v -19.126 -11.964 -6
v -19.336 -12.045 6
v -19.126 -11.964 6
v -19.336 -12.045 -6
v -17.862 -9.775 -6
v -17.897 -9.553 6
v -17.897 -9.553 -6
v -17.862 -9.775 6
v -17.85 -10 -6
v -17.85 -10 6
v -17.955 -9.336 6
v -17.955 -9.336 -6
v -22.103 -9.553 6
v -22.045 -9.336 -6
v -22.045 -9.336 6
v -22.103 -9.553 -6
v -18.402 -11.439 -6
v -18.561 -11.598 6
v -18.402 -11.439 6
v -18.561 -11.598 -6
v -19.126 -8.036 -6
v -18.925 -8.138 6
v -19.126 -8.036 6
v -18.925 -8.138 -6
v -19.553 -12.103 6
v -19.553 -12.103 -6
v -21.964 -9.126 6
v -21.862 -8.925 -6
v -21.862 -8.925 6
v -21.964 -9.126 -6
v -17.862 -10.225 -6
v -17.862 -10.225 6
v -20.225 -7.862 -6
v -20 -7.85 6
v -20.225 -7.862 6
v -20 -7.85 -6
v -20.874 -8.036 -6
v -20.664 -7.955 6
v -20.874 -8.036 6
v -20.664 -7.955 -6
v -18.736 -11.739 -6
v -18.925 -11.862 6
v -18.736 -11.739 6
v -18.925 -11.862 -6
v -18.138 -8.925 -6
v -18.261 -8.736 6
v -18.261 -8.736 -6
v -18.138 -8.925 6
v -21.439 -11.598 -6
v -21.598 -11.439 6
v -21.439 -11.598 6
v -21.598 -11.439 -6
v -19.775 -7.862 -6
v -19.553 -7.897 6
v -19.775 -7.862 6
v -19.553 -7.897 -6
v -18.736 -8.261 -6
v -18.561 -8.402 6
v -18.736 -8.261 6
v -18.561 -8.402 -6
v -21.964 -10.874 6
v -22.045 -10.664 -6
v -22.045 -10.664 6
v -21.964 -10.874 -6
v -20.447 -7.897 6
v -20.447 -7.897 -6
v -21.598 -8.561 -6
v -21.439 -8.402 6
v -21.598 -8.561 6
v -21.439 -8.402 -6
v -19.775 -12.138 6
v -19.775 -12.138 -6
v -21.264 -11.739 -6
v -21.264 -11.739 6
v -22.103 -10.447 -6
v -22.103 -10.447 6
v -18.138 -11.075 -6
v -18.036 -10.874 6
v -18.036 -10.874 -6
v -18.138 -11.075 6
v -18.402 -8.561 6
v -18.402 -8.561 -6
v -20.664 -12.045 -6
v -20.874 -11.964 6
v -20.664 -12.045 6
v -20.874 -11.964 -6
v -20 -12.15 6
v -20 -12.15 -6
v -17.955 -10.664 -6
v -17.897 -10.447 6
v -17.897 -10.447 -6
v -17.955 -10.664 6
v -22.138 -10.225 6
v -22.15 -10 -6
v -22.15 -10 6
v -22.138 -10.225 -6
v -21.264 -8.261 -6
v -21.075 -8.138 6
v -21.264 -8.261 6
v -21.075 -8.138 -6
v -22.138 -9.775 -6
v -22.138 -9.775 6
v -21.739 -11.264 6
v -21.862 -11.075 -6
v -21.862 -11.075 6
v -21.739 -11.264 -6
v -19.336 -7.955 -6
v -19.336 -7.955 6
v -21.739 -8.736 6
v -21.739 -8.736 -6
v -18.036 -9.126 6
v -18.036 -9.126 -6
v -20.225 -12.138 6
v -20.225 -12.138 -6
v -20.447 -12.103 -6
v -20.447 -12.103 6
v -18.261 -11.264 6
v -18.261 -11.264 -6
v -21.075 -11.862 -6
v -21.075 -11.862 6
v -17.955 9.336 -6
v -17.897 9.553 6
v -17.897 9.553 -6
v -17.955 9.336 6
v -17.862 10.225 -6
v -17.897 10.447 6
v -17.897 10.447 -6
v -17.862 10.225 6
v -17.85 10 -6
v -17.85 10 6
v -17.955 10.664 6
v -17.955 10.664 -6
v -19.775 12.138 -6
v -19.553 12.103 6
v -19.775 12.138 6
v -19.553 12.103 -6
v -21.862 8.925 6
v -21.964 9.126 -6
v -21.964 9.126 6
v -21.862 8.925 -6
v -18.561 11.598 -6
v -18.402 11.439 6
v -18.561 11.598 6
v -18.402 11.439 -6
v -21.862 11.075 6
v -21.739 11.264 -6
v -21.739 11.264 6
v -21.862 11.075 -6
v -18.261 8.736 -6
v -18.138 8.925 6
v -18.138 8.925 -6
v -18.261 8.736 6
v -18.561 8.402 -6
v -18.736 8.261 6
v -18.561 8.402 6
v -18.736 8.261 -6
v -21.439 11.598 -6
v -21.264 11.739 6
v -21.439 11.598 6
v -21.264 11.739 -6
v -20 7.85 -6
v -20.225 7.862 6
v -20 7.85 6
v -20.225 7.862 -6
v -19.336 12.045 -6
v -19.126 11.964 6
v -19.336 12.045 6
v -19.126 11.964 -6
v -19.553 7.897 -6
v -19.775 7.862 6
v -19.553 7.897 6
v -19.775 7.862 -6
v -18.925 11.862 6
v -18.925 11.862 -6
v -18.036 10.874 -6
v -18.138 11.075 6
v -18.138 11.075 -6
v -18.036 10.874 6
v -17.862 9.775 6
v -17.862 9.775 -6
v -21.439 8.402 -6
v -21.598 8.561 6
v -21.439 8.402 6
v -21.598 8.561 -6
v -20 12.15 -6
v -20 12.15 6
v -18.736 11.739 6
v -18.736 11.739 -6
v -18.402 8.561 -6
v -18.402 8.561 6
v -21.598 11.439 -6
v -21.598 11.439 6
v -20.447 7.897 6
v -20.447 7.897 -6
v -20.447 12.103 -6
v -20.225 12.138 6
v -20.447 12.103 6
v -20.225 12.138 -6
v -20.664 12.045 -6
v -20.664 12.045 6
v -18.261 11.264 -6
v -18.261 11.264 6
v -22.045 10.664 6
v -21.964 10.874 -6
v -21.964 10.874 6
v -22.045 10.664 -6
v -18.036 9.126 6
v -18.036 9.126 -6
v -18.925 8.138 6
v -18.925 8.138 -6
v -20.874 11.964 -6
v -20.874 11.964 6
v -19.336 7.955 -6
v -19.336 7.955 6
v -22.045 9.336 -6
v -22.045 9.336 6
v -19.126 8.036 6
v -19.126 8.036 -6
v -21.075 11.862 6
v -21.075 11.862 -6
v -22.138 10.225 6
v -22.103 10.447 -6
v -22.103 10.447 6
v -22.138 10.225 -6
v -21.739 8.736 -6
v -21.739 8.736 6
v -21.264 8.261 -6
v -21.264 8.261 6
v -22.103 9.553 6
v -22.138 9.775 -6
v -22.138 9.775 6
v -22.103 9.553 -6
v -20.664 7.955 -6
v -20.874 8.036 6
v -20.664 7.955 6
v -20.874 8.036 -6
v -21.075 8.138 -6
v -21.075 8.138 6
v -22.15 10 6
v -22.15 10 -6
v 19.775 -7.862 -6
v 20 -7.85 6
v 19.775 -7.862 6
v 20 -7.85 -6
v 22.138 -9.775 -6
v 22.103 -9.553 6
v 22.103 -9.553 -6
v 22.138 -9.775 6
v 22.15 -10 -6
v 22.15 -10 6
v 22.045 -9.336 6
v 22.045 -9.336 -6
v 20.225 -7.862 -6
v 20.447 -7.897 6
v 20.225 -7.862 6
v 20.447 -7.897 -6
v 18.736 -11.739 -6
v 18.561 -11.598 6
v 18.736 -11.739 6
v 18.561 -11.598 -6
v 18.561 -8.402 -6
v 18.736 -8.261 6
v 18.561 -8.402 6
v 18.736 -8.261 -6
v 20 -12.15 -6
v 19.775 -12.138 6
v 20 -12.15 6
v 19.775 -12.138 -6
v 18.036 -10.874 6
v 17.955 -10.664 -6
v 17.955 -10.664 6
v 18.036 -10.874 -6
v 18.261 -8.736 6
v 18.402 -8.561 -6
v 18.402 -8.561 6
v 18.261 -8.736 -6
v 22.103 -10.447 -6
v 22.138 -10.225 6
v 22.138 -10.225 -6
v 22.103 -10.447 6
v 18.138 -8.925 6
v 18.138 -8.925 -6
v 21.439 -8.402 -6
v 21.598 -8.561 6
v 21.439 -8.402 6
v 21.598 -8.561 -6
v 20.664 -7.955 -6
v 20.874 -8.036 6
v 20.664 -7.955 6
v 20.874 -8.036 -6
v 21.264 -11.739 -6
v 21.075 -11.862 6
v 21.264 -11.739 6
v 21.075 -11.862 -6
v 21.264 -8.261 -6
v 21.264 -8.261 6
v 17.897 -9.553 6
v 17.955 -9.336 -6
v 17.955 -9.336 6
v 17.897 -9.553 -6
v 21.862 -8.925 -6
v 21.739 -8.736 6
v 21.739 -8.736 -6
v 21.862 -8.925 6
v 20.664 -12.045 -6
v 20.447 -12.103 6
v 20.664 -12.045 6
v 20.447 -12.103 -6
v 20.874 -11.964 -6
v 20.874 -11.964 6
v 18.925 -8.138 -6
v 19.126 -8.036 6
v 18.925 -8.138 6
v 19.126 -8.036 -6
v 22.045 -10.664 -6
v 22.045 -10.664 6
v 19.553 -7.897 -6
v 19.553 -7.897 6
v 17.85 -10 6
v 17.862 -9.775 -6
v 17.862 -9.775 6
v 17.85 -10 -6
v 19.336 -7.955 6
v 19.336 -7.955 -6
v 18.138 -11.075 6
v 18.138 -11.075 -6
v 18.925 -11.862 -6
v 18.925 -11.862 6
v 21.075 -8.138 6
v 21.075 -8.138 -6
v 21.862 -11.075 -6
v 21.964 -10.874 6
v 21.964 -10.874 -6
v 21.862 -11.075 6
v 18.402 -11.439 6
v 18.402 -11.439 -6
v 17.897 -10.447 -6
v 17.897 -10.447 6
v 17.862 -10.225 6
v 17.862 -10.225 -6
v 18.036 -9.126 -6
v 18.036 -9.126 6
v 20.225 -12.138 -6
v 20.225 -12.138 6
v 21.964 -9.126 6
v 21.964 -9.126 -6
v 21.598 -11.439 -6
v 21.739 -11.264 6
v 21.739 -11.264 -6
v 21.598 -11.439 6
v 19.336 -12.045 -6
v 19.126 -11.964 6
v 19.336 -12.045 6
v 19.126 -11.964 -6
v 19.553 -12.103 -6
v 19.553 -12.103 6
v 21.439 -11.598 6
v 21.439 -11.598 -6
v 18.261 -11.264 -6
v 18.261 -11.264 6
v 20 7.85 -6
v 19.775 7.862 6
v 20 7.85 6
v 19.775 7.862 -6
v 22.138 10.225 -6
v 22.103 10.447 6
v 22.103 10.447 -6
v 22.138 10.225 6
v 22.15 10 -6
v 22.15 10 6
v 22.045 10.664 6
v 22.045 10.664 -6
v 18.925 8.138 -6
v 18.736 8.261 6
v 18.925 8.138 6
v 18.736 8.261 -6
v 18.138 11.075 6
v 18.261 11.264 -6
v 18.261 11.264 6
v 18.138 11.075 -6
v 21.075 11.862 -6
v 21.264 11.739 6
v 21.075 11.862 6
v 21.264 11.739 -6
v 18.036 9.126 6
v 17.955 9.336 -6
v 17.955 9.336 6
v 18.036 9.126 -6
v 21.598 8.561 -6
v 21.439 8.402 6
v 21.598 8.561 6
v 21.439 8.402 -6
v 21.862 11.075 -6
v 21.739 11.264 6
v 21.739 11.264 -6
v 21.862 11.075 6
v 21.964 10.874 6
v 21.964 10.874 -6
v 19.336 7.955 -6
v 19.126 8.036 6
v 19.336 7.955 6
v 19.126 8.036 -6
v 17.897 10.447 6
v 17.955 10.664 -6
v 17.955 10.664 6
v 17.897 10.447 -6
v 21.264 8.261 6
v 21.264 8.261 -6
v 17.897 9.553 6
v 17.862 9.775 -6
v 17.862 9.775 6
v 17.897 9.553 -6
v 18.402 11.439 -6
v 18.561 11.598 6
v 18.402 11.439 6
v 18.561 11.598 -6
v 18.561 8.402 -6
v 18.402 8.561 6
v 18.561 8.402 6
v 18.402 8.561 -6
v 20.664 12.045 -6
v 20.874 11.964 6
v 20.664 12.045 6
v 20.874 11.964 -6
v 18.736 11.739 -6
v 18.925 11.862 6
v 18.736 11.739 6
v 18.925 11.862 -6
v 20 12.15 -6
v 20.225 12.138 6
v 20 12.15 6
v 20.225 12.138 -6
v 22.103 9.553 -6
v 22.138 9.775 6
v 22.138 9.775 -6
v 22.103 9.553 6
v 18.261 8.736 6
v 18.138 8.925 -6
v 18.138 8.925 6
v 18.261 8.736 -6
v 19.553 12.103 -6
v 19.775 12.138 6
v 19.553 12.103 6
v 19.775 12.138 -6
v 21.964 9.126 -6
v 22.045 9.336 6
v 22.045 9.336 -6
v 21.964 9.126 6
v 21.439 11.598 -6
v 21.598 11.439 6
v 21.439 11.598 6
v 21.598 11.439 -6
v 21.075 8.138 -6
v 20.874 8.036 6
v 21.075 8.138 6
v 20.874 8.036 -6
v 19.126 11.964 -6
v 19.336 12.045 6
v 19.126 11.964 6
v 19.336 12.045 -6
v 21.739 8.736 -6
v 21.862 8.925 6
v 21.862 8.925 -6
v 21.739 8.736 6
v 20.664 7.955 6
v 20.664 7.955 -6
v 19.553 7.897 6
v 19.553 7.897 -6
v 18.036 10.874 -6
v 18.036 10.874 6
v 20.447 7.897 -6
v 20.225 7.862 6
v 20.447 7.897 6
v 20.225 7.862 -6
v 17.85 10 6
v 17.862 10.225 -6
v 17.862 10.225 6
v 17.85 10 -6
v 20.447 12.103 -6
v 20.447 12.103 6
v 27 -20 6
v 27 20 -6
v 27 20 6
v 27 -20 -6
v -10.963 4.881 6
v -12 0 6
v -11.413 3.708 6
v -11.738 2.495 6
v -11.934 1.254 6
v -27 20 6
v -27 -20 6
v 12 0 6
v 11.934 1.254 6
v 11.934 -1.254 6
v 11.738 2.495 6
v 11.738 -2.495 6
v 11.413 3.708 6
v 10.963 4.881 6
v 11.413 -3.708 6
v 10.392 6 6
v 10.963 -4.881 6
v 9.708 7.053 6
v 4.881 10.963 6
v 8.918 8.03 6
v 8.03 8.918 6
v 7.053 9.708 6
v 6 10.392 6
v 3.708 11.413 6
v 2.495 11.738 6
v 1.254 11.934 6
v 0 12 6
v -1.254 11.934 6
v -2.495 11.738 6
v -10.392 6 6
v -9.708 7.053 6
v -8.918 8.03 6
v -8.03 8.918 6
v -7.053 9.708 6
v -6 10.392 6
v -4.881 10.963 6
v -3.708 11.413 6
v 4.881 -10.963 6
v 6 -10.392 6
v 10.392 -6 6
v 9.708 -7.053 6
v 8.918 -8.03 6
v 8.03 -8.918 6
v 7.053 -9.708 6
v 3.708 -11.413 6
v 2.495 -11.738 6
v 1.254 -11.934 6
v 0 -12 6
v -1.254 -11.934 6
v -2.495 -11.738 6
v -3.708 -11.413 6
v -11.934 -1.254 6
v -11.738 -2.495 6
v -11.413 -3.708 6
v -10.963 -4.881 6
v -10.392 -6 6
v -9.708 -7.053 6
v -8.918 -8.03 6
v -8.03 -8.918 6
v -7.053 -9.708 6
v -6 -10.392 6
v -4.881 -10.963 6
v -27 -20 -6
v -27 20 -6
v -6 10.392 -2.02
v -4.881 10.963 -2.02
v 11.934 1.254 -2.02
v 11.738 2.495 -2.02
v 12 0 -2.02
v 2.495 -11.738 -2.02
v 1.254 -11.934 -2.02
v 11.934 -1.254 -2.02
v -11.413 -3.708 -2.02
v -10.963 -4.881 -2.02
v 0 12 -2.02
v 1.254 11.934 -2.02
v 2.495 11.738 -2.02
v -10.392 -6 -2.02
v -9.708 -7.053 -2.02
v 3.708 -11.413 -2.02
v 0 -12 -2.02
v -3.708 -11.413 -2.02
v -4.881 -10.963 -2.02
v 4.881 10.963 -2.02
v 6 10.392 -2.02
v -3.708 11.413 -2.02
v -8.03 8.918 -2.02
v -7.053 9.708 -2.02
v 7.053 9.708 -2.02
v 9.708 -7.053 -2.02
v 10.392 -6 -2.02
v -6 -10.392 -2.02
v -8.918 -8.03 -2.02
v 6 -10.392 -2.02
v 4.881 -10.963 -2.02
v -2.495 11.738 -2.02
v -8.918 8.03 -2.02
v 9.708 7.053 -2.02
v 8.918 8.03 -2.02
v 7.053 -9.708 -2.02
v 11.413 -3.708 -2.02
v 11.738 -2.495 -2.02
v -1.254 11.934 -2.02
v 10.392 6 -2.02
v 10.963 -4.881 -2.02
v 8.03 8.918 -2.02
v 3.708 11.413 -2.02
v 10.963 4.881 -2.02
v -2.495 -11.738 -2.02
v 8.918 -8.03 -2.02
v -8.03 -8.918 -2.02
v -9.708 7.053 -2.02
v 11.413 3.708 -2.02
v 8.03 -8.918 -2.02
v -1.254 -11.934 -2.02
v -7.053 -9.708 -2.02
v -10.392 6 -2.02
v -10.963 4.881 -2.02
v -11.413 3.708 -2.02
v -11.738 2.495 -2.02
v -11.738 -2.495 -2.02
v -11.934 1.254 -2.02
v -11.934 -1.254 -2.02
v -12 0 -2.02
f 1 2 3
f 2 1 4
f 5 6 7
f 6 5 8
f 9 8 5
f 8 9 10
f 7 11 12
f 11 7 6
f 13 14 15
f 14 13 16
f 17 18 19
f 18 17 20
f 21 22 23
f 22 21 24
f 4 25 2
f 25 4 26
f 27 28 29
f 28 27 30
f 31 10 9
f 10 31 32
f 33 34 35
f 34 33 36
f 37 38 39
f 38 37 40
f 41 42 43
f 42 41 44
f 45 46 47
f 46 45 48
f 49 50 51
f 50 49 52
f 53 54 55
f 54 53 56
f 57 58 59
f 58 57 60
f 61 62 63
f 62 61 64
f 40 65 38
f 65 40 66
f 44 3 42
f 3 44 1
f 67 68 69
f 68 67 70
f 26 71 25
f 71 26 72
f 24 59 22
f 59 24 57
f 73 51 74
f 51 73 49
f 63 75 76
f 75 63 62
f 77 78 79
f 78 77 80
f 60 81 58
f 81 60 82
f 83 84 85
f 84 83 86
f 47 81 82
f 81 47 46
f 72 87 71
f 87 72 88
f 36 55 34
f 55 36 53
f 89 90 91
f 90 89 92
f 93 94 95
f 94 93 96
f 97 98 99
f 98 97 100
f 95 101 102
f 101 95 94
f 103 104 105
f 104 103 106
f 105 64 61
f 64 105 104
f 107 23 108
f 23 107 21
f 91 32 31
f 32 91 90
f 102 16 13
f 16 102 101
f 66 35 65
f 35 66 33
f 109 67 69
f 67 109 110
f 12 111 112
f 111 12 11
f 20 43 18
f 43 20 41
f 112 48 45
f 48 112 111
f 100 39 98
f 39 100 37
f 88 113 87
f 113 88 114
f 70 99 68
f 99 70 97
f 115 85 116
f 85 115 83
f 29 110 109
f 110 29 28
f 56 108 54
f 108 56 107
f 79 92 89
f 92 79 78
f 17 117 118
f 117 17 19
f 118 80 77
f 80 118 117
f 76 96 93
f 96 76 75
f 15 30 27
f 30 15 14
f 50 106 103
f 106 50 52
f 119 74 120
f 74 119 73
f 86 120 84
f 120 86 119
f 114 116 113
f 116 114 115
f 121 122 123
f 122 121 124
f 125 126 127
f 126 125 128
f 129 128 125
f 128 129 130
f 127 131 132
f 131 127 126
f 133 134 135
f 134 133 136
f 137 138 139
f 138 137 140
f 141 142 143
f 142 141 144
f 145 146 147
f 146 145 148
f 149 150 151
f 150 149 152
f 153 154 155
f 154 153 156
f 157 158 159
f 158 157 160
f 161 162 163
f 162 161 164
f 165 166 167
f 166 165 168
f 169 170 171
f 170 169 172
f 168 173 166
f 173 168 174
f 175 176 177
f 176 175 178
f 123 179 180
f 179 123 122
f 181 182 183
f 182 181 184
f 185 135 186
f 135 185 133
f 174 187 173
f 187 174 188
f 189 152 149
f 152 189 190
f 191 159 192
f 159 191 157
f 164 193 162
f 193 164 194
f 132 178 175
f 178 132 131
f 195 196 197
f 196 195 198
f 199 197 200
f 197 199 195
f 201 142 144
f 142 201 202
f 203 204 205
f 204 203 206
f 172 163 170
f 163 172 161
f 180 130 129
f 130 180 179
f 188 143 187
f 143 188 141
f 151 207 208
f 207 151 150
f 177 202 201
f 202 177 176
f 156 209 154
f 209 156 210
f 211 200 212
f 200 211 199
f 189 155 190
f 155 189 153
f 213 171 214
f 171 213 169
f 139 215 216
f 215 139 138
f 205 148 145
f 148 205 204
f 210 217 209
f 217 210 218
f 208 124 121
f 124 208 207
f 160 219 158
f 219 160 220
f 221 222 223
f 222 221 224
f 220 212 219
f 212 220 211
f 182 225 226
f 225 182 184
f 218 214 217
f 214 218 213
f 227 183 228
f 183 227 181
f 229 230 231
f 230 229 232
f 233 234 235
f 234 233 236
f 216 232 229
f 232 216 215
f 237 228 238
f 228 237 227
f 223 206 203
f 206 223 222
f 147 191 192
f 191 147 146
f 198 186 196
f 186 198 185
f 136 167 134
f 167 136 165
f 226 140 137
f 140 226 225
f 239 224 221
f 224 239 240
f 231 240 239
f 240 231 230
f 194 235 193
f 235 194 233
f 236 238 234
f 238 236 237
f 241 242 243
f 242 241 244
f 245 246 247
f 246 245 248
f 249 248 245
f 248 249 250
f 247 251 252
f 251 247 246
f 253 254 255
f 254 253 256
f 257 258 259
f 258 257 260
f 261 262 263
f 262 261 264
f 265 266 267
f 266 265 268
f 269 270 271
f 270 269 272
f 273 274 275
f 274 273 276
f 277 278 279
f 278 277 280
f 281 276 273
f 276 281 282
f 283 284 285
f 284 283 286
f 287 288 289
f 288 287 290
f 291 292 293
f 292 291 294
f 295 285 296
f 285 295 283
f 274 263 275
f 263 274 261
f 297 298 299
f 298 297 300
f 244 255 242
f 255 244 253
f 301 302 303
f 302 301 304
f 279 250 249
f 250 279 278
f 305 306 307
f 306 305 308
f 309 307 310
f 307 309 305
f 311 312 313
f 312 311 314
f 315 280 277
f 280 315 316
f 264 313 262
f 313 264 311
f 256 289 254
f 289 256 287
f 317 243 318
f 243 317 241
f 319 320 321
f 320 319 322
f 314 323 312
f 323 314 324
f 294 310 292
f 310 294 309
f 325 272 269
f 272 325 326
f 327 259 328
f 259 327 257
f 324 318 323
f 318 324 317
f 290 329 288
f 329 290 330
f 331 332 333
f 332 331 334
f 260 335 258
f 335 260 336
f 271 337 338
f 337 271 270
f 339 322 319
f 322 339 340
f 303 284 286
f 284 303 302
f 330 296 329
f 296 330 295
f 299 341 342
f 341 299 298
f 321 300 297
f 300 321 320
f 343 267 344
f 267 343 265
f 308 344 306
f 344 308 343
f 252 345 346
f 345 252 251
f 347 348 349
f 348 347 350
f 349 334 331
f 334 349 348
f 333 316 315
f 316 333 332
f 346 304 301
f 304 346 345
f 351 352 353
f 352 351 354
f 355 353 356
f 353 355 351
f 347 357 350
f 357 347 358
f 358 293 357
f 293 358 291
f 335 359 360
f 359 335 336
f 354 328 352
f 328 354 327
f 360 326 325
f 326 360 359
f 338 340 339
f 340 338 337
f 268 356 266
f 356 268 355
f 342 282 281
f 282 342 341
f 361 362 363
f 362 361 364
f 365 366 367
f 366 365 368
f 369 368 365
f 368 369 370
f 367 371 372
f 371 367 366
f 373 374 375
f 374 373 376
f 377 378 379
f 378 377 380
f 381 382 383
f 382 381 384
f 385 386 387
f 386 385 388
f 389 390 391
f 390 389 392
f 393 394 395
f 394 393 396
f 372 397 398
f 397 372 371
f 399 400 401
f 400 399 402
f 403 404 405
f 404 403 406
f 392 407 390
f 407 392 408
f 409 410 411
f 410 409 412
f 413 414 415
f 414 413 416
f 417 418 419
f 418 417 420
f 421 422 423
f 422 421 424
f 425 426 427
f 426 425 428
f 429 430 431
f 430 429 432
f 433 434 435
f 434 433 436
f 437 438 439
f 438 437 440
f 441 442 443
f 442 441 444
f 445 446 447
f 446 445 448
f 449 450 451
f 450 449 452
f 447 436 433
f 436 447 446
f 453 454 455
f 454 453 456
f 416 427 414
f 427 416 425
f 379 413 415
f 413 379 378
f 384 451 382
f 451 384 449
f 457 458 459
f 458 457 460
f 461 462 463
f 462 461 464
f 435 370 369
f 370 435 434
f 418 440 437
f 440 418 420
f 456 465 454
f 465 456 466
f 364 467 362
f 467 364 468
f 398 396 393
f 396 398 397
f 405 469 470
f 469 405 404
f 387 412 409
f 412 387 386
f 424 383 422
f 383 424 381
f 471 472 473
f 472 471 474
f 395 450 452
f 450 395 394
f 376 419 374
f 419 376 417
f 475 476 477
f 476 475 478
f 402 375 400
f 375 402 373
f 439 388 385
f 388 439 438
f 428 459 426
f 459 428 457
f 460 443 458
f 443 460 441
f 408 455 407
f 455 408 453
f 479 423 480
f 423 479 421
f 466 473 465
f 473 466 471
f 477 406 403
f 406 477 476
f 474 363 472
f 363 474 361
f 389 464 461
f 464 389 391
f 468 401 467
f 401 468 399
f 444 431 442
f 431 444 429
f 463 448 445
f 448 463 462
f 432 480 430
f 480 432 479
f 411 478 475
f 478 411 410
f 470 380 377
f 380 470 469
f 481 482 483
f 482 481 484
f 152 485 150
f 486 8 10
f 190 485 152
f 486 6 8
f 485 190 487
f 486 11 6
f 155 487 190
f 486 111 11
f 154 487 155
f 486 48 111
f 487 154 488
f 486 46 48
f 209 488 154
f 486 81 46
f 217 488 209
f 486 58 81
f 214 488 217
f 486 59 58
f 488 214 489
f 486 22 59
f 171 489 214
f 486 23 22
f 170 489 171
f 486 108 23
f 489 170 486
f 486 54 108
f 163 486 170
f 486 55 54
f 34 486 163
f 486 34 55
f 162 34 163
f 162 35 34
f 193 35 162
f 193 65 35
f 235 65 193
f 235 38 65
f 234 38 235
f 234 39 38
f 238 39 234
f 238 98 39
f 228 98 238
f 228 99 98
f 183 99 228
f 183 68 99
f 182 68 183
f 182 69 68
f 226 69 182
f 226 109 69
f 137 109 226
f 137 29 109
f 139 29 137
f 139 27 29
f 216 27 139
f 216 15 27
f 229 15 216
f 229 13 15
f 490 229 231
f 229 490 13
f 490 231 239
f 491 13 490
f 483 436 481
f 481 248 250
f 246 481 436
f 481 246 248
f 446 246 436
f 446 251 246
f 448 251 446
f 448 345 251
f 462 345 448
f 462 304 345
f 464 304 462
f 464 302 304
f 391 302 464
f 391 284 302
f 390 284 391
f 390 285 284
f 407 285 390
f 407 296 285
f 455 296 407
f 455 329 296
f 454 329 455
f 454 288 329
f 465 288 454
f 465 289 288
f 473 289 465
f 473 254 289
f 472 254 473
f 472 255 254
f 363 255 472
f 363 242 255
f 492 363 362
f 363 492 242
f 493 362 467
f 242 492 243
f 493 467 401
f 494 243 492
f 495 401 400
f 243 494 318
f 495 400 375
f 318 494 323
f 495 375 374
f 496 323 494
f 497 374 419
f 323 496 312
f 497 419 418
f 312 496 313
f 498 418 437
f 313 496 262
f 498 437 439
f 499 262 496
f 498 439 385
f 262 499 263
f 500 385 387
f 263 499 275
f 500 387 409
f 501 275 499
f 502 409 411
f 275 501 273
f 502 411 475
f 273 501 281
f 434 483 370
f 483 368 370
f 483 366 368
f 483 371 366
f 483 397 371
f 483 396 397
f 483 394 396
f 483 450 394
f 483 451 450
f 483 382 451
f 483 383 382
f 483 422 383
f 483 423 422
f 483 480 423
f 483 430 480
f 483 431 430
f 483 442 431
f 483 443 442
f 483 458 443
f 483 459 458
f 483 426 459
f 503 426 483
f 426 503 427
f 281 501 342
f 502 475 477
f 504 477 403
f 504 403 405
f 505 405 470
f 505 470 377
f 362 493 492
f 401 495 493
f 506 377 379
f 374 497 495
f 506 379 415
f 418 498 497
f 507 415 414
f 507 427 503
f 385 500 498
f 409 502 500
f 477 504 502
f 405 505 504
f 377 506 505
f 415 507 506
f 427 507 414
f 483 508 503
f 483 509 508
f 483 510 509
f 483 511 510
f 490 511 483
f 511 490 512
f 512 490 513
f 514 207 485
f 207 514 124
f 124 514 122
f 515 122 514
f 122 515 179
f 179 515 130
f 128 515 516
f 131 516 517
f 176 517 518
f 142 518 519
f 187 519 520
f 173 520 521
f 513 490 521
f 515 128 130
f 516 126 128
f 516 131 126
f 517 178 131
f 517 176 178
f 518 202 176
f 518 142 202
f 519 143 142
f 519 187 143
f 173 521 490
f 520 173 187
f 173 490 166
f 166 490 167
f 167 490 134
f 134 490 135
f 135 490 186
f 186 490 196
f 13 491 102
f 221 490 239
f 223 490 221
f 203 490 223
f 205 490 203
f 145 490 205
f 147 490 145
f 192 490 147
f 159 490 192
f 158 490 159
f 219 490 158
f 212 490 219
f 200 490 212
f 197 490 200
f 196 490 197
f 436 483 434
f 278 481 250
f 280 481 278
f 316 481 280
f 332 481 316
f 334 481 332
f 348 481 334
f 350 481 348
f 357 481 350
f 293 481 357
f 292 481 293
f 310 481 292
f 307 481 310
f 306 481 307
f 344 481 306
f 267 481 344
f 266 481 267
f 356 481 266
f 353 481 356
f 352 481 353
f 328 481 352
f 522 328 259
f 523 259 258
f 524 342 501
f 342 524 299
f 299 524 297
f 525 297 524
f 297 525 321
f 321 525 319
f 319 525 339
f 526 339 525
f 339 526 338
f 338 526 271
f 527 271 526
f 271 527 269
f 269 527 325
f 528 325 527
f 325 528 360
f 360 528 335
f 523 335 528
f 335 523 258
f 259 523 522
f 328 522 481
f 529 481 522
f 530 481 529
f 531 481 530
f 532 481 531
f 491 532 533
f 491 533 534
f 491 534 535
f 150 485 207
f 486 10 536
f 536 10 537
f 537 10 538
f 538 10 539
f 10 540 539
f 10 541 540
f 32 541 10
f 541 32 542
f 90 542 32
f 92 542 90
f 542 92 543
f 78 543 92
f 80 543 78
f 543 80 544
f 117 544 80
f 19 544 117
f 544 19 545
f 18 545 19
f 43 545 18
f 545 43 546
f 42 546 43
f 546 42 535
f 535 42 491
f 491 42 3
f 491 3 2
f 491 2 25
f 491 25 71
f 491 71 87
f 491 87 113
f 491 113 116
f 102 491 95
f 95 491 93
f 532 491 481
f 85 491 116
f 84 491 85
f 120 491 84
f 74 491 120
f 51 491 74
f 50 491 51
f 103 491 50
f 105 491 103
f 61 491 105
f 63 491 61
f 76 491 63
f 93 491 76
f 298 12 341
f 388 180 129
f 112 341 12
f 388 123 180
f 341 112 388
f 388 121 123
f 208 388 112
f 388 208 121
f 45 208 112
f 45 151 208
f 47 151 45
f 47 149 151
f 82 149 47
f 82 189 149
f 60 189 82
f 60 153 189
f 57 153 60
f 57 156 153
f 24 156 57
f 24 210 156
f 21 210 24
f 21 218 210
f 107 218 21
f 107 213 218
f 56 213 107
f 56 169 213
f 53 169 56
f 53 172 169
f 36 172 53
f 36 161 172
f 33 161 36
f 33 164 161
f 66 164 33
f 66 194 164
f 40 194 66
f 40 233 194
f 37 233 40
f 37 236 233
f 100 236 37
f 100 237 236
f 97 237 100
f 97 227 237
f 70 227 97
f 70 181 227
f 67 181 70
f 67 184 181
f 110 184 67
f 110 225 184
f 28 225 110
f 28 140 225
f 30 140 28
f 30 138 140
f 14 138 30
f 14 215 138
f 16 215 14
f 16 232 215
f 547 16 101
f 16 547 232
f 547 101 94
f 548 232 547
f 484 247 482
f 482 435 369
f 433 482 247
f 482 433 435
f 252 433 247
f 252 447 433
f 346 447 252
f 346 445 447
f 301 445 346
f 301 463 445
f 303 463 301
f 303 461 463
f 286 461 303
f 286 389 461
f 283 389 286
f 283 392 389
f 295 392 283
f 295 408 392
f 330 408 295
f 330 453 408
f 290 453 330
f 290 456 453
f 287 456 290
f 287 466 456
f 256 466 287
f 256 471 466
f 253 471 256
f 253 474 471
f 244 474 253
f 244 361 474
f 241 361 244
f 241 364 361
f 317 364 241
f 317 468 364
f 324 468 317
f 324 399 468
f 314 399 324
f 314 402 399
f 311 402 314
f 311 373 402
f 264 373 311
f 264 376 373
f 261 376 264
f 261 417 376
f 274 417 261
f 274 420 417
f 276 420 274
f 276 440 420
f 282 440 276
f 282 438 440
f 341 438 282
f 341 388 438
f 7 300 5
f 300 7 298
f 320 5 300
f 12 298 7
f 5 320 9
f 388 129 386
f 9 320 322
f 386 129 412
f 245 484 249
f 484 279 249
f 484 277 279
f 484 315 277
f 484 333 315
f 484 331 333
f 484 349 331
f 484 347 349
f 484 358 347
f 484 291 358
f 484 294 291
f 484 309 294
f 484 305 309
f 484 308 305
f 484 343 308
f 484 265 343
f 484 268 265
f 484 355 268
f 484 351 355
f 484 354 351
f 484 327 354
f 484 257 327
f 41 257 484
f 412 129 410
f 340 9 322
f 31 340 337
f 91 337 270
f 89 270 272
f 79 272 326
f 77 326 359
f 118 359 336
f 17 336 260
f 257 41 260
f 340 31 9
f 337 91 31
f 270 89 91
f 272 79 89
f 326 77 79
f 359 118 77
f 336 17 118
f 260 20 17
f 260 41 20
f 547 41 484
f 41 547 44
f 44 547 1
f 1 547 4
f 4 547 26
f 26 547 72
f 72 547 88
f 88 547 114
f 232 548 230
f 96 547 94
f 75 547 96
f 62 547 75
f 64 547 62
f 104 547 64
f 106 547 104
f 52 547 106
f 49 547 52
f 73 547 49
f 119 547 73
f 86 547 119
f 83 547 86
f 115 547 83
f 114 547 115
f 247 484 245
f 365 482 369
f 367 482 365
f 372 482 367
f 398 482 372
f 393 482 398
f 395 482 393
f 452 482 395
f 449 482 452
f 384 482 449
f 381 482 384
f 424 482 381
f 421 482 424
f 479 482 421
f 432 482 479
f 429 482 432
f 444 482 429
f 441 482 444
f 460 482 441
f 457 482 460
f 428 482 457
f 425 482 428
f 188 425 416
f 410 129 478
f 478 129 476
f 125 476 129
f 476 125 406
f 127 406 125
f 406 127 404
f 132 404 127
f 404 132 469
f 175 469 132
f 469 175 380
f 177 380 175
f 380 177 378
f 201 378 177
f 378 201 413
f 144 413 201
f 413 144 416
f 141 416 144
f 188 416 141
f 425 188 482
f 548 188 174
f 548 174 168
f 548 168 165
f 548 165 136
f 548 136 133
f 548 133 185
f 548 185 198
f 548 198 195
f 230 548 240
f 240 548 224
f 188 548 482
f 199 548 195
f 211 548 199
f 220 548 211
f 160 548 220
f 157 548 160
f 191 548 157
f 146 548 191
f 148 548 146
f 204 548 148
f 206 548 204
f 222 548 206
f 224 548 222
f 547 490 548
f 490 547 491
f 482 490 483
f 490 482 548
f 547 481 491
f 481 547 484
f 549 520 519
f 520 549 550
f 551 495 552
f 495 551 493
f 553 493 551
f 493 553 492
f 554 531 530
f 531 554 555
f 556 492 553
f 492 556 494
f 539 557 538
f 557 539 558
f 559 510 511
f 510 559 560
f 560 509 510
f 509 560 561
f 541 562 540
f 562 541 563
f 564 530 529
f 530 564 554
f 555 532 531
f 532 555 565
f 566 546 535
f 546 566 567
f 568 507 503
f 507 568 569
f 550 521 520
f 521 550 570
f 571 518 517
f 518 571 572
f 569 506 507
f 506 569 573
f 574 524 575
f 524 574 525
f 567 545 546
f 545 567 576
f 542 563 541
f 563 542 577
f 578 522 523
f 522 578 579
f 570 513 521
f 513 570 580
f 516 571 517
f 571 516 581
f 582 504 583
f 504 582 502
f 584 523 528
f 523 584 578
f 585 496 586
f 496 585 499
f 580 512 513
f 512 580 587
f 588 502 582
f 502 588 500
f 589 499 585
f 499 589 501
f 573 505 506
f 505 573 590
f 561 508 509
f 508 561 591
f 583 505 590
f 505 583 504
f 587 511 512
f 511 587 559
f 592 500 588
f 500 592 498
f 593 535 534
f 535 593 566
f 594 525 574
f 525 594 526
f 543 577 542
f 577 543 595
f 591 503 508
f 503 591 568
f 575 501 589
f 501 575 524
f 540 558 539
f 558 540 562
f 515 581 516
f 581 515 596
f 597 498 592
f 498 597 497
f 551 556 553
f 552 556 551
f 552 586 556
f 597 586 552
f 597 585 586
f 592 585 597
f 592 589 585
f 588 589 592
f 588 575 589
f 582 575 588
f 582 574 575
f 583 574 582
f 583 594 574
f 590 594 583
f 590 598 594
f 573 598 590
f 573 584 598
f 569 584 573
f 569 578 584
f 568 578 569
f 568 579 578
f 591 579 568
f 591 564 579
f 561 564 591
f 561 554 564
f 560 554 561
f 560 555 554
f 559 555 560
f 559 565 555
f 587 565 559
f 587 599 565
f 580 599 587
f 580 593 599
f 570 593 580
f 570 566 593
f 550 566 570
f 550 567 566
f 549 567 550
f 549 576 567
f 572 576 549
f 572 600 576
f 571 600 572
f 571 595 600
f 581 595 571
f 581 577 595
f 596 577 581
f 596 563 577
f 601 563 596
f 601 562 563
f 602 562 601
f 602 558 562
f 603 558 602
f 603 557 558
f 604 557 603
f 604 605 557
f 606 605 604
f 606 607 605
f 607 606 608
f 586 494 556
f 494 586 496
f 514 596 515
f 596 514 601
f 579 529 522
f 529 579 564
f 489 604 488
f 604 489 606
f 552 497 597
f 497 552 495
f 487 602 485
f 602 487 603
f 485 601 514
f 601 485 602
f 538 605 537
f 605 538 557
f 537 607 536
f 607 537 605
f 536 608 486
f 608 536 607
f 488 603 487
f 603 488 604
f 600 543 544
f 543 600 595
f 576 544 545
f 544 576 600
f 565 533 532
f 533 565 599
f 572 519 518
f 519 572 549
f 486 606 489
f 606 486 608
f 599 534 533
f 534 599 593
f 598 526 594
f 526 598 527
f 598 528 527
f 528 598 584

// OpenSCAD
// Lead-screw nut holder with 24 mm pocket.
$fn = 60;
eps = 0.02;
body_l = 54;
body_w = 40;
body_t = 12;
pocket_d = 24;
pocket_depth = 8;
mount_x = 20.0;
difference() {
    cube([body_l, body_w, body_t], center = true);
    translate([0, 0, body_t / 2 - pocket_depth - eps]) cylinder(d = pocket_d, h = pocket_depth + 2 * eps);
    for (x = [-mount_x, mount_x], y = [-body_w / 4, body_w / 4])
        translate([x, y, -body_t / 2 - eps]) cylinder(d = 4.3, h = body_t + 2 * eps);
}
